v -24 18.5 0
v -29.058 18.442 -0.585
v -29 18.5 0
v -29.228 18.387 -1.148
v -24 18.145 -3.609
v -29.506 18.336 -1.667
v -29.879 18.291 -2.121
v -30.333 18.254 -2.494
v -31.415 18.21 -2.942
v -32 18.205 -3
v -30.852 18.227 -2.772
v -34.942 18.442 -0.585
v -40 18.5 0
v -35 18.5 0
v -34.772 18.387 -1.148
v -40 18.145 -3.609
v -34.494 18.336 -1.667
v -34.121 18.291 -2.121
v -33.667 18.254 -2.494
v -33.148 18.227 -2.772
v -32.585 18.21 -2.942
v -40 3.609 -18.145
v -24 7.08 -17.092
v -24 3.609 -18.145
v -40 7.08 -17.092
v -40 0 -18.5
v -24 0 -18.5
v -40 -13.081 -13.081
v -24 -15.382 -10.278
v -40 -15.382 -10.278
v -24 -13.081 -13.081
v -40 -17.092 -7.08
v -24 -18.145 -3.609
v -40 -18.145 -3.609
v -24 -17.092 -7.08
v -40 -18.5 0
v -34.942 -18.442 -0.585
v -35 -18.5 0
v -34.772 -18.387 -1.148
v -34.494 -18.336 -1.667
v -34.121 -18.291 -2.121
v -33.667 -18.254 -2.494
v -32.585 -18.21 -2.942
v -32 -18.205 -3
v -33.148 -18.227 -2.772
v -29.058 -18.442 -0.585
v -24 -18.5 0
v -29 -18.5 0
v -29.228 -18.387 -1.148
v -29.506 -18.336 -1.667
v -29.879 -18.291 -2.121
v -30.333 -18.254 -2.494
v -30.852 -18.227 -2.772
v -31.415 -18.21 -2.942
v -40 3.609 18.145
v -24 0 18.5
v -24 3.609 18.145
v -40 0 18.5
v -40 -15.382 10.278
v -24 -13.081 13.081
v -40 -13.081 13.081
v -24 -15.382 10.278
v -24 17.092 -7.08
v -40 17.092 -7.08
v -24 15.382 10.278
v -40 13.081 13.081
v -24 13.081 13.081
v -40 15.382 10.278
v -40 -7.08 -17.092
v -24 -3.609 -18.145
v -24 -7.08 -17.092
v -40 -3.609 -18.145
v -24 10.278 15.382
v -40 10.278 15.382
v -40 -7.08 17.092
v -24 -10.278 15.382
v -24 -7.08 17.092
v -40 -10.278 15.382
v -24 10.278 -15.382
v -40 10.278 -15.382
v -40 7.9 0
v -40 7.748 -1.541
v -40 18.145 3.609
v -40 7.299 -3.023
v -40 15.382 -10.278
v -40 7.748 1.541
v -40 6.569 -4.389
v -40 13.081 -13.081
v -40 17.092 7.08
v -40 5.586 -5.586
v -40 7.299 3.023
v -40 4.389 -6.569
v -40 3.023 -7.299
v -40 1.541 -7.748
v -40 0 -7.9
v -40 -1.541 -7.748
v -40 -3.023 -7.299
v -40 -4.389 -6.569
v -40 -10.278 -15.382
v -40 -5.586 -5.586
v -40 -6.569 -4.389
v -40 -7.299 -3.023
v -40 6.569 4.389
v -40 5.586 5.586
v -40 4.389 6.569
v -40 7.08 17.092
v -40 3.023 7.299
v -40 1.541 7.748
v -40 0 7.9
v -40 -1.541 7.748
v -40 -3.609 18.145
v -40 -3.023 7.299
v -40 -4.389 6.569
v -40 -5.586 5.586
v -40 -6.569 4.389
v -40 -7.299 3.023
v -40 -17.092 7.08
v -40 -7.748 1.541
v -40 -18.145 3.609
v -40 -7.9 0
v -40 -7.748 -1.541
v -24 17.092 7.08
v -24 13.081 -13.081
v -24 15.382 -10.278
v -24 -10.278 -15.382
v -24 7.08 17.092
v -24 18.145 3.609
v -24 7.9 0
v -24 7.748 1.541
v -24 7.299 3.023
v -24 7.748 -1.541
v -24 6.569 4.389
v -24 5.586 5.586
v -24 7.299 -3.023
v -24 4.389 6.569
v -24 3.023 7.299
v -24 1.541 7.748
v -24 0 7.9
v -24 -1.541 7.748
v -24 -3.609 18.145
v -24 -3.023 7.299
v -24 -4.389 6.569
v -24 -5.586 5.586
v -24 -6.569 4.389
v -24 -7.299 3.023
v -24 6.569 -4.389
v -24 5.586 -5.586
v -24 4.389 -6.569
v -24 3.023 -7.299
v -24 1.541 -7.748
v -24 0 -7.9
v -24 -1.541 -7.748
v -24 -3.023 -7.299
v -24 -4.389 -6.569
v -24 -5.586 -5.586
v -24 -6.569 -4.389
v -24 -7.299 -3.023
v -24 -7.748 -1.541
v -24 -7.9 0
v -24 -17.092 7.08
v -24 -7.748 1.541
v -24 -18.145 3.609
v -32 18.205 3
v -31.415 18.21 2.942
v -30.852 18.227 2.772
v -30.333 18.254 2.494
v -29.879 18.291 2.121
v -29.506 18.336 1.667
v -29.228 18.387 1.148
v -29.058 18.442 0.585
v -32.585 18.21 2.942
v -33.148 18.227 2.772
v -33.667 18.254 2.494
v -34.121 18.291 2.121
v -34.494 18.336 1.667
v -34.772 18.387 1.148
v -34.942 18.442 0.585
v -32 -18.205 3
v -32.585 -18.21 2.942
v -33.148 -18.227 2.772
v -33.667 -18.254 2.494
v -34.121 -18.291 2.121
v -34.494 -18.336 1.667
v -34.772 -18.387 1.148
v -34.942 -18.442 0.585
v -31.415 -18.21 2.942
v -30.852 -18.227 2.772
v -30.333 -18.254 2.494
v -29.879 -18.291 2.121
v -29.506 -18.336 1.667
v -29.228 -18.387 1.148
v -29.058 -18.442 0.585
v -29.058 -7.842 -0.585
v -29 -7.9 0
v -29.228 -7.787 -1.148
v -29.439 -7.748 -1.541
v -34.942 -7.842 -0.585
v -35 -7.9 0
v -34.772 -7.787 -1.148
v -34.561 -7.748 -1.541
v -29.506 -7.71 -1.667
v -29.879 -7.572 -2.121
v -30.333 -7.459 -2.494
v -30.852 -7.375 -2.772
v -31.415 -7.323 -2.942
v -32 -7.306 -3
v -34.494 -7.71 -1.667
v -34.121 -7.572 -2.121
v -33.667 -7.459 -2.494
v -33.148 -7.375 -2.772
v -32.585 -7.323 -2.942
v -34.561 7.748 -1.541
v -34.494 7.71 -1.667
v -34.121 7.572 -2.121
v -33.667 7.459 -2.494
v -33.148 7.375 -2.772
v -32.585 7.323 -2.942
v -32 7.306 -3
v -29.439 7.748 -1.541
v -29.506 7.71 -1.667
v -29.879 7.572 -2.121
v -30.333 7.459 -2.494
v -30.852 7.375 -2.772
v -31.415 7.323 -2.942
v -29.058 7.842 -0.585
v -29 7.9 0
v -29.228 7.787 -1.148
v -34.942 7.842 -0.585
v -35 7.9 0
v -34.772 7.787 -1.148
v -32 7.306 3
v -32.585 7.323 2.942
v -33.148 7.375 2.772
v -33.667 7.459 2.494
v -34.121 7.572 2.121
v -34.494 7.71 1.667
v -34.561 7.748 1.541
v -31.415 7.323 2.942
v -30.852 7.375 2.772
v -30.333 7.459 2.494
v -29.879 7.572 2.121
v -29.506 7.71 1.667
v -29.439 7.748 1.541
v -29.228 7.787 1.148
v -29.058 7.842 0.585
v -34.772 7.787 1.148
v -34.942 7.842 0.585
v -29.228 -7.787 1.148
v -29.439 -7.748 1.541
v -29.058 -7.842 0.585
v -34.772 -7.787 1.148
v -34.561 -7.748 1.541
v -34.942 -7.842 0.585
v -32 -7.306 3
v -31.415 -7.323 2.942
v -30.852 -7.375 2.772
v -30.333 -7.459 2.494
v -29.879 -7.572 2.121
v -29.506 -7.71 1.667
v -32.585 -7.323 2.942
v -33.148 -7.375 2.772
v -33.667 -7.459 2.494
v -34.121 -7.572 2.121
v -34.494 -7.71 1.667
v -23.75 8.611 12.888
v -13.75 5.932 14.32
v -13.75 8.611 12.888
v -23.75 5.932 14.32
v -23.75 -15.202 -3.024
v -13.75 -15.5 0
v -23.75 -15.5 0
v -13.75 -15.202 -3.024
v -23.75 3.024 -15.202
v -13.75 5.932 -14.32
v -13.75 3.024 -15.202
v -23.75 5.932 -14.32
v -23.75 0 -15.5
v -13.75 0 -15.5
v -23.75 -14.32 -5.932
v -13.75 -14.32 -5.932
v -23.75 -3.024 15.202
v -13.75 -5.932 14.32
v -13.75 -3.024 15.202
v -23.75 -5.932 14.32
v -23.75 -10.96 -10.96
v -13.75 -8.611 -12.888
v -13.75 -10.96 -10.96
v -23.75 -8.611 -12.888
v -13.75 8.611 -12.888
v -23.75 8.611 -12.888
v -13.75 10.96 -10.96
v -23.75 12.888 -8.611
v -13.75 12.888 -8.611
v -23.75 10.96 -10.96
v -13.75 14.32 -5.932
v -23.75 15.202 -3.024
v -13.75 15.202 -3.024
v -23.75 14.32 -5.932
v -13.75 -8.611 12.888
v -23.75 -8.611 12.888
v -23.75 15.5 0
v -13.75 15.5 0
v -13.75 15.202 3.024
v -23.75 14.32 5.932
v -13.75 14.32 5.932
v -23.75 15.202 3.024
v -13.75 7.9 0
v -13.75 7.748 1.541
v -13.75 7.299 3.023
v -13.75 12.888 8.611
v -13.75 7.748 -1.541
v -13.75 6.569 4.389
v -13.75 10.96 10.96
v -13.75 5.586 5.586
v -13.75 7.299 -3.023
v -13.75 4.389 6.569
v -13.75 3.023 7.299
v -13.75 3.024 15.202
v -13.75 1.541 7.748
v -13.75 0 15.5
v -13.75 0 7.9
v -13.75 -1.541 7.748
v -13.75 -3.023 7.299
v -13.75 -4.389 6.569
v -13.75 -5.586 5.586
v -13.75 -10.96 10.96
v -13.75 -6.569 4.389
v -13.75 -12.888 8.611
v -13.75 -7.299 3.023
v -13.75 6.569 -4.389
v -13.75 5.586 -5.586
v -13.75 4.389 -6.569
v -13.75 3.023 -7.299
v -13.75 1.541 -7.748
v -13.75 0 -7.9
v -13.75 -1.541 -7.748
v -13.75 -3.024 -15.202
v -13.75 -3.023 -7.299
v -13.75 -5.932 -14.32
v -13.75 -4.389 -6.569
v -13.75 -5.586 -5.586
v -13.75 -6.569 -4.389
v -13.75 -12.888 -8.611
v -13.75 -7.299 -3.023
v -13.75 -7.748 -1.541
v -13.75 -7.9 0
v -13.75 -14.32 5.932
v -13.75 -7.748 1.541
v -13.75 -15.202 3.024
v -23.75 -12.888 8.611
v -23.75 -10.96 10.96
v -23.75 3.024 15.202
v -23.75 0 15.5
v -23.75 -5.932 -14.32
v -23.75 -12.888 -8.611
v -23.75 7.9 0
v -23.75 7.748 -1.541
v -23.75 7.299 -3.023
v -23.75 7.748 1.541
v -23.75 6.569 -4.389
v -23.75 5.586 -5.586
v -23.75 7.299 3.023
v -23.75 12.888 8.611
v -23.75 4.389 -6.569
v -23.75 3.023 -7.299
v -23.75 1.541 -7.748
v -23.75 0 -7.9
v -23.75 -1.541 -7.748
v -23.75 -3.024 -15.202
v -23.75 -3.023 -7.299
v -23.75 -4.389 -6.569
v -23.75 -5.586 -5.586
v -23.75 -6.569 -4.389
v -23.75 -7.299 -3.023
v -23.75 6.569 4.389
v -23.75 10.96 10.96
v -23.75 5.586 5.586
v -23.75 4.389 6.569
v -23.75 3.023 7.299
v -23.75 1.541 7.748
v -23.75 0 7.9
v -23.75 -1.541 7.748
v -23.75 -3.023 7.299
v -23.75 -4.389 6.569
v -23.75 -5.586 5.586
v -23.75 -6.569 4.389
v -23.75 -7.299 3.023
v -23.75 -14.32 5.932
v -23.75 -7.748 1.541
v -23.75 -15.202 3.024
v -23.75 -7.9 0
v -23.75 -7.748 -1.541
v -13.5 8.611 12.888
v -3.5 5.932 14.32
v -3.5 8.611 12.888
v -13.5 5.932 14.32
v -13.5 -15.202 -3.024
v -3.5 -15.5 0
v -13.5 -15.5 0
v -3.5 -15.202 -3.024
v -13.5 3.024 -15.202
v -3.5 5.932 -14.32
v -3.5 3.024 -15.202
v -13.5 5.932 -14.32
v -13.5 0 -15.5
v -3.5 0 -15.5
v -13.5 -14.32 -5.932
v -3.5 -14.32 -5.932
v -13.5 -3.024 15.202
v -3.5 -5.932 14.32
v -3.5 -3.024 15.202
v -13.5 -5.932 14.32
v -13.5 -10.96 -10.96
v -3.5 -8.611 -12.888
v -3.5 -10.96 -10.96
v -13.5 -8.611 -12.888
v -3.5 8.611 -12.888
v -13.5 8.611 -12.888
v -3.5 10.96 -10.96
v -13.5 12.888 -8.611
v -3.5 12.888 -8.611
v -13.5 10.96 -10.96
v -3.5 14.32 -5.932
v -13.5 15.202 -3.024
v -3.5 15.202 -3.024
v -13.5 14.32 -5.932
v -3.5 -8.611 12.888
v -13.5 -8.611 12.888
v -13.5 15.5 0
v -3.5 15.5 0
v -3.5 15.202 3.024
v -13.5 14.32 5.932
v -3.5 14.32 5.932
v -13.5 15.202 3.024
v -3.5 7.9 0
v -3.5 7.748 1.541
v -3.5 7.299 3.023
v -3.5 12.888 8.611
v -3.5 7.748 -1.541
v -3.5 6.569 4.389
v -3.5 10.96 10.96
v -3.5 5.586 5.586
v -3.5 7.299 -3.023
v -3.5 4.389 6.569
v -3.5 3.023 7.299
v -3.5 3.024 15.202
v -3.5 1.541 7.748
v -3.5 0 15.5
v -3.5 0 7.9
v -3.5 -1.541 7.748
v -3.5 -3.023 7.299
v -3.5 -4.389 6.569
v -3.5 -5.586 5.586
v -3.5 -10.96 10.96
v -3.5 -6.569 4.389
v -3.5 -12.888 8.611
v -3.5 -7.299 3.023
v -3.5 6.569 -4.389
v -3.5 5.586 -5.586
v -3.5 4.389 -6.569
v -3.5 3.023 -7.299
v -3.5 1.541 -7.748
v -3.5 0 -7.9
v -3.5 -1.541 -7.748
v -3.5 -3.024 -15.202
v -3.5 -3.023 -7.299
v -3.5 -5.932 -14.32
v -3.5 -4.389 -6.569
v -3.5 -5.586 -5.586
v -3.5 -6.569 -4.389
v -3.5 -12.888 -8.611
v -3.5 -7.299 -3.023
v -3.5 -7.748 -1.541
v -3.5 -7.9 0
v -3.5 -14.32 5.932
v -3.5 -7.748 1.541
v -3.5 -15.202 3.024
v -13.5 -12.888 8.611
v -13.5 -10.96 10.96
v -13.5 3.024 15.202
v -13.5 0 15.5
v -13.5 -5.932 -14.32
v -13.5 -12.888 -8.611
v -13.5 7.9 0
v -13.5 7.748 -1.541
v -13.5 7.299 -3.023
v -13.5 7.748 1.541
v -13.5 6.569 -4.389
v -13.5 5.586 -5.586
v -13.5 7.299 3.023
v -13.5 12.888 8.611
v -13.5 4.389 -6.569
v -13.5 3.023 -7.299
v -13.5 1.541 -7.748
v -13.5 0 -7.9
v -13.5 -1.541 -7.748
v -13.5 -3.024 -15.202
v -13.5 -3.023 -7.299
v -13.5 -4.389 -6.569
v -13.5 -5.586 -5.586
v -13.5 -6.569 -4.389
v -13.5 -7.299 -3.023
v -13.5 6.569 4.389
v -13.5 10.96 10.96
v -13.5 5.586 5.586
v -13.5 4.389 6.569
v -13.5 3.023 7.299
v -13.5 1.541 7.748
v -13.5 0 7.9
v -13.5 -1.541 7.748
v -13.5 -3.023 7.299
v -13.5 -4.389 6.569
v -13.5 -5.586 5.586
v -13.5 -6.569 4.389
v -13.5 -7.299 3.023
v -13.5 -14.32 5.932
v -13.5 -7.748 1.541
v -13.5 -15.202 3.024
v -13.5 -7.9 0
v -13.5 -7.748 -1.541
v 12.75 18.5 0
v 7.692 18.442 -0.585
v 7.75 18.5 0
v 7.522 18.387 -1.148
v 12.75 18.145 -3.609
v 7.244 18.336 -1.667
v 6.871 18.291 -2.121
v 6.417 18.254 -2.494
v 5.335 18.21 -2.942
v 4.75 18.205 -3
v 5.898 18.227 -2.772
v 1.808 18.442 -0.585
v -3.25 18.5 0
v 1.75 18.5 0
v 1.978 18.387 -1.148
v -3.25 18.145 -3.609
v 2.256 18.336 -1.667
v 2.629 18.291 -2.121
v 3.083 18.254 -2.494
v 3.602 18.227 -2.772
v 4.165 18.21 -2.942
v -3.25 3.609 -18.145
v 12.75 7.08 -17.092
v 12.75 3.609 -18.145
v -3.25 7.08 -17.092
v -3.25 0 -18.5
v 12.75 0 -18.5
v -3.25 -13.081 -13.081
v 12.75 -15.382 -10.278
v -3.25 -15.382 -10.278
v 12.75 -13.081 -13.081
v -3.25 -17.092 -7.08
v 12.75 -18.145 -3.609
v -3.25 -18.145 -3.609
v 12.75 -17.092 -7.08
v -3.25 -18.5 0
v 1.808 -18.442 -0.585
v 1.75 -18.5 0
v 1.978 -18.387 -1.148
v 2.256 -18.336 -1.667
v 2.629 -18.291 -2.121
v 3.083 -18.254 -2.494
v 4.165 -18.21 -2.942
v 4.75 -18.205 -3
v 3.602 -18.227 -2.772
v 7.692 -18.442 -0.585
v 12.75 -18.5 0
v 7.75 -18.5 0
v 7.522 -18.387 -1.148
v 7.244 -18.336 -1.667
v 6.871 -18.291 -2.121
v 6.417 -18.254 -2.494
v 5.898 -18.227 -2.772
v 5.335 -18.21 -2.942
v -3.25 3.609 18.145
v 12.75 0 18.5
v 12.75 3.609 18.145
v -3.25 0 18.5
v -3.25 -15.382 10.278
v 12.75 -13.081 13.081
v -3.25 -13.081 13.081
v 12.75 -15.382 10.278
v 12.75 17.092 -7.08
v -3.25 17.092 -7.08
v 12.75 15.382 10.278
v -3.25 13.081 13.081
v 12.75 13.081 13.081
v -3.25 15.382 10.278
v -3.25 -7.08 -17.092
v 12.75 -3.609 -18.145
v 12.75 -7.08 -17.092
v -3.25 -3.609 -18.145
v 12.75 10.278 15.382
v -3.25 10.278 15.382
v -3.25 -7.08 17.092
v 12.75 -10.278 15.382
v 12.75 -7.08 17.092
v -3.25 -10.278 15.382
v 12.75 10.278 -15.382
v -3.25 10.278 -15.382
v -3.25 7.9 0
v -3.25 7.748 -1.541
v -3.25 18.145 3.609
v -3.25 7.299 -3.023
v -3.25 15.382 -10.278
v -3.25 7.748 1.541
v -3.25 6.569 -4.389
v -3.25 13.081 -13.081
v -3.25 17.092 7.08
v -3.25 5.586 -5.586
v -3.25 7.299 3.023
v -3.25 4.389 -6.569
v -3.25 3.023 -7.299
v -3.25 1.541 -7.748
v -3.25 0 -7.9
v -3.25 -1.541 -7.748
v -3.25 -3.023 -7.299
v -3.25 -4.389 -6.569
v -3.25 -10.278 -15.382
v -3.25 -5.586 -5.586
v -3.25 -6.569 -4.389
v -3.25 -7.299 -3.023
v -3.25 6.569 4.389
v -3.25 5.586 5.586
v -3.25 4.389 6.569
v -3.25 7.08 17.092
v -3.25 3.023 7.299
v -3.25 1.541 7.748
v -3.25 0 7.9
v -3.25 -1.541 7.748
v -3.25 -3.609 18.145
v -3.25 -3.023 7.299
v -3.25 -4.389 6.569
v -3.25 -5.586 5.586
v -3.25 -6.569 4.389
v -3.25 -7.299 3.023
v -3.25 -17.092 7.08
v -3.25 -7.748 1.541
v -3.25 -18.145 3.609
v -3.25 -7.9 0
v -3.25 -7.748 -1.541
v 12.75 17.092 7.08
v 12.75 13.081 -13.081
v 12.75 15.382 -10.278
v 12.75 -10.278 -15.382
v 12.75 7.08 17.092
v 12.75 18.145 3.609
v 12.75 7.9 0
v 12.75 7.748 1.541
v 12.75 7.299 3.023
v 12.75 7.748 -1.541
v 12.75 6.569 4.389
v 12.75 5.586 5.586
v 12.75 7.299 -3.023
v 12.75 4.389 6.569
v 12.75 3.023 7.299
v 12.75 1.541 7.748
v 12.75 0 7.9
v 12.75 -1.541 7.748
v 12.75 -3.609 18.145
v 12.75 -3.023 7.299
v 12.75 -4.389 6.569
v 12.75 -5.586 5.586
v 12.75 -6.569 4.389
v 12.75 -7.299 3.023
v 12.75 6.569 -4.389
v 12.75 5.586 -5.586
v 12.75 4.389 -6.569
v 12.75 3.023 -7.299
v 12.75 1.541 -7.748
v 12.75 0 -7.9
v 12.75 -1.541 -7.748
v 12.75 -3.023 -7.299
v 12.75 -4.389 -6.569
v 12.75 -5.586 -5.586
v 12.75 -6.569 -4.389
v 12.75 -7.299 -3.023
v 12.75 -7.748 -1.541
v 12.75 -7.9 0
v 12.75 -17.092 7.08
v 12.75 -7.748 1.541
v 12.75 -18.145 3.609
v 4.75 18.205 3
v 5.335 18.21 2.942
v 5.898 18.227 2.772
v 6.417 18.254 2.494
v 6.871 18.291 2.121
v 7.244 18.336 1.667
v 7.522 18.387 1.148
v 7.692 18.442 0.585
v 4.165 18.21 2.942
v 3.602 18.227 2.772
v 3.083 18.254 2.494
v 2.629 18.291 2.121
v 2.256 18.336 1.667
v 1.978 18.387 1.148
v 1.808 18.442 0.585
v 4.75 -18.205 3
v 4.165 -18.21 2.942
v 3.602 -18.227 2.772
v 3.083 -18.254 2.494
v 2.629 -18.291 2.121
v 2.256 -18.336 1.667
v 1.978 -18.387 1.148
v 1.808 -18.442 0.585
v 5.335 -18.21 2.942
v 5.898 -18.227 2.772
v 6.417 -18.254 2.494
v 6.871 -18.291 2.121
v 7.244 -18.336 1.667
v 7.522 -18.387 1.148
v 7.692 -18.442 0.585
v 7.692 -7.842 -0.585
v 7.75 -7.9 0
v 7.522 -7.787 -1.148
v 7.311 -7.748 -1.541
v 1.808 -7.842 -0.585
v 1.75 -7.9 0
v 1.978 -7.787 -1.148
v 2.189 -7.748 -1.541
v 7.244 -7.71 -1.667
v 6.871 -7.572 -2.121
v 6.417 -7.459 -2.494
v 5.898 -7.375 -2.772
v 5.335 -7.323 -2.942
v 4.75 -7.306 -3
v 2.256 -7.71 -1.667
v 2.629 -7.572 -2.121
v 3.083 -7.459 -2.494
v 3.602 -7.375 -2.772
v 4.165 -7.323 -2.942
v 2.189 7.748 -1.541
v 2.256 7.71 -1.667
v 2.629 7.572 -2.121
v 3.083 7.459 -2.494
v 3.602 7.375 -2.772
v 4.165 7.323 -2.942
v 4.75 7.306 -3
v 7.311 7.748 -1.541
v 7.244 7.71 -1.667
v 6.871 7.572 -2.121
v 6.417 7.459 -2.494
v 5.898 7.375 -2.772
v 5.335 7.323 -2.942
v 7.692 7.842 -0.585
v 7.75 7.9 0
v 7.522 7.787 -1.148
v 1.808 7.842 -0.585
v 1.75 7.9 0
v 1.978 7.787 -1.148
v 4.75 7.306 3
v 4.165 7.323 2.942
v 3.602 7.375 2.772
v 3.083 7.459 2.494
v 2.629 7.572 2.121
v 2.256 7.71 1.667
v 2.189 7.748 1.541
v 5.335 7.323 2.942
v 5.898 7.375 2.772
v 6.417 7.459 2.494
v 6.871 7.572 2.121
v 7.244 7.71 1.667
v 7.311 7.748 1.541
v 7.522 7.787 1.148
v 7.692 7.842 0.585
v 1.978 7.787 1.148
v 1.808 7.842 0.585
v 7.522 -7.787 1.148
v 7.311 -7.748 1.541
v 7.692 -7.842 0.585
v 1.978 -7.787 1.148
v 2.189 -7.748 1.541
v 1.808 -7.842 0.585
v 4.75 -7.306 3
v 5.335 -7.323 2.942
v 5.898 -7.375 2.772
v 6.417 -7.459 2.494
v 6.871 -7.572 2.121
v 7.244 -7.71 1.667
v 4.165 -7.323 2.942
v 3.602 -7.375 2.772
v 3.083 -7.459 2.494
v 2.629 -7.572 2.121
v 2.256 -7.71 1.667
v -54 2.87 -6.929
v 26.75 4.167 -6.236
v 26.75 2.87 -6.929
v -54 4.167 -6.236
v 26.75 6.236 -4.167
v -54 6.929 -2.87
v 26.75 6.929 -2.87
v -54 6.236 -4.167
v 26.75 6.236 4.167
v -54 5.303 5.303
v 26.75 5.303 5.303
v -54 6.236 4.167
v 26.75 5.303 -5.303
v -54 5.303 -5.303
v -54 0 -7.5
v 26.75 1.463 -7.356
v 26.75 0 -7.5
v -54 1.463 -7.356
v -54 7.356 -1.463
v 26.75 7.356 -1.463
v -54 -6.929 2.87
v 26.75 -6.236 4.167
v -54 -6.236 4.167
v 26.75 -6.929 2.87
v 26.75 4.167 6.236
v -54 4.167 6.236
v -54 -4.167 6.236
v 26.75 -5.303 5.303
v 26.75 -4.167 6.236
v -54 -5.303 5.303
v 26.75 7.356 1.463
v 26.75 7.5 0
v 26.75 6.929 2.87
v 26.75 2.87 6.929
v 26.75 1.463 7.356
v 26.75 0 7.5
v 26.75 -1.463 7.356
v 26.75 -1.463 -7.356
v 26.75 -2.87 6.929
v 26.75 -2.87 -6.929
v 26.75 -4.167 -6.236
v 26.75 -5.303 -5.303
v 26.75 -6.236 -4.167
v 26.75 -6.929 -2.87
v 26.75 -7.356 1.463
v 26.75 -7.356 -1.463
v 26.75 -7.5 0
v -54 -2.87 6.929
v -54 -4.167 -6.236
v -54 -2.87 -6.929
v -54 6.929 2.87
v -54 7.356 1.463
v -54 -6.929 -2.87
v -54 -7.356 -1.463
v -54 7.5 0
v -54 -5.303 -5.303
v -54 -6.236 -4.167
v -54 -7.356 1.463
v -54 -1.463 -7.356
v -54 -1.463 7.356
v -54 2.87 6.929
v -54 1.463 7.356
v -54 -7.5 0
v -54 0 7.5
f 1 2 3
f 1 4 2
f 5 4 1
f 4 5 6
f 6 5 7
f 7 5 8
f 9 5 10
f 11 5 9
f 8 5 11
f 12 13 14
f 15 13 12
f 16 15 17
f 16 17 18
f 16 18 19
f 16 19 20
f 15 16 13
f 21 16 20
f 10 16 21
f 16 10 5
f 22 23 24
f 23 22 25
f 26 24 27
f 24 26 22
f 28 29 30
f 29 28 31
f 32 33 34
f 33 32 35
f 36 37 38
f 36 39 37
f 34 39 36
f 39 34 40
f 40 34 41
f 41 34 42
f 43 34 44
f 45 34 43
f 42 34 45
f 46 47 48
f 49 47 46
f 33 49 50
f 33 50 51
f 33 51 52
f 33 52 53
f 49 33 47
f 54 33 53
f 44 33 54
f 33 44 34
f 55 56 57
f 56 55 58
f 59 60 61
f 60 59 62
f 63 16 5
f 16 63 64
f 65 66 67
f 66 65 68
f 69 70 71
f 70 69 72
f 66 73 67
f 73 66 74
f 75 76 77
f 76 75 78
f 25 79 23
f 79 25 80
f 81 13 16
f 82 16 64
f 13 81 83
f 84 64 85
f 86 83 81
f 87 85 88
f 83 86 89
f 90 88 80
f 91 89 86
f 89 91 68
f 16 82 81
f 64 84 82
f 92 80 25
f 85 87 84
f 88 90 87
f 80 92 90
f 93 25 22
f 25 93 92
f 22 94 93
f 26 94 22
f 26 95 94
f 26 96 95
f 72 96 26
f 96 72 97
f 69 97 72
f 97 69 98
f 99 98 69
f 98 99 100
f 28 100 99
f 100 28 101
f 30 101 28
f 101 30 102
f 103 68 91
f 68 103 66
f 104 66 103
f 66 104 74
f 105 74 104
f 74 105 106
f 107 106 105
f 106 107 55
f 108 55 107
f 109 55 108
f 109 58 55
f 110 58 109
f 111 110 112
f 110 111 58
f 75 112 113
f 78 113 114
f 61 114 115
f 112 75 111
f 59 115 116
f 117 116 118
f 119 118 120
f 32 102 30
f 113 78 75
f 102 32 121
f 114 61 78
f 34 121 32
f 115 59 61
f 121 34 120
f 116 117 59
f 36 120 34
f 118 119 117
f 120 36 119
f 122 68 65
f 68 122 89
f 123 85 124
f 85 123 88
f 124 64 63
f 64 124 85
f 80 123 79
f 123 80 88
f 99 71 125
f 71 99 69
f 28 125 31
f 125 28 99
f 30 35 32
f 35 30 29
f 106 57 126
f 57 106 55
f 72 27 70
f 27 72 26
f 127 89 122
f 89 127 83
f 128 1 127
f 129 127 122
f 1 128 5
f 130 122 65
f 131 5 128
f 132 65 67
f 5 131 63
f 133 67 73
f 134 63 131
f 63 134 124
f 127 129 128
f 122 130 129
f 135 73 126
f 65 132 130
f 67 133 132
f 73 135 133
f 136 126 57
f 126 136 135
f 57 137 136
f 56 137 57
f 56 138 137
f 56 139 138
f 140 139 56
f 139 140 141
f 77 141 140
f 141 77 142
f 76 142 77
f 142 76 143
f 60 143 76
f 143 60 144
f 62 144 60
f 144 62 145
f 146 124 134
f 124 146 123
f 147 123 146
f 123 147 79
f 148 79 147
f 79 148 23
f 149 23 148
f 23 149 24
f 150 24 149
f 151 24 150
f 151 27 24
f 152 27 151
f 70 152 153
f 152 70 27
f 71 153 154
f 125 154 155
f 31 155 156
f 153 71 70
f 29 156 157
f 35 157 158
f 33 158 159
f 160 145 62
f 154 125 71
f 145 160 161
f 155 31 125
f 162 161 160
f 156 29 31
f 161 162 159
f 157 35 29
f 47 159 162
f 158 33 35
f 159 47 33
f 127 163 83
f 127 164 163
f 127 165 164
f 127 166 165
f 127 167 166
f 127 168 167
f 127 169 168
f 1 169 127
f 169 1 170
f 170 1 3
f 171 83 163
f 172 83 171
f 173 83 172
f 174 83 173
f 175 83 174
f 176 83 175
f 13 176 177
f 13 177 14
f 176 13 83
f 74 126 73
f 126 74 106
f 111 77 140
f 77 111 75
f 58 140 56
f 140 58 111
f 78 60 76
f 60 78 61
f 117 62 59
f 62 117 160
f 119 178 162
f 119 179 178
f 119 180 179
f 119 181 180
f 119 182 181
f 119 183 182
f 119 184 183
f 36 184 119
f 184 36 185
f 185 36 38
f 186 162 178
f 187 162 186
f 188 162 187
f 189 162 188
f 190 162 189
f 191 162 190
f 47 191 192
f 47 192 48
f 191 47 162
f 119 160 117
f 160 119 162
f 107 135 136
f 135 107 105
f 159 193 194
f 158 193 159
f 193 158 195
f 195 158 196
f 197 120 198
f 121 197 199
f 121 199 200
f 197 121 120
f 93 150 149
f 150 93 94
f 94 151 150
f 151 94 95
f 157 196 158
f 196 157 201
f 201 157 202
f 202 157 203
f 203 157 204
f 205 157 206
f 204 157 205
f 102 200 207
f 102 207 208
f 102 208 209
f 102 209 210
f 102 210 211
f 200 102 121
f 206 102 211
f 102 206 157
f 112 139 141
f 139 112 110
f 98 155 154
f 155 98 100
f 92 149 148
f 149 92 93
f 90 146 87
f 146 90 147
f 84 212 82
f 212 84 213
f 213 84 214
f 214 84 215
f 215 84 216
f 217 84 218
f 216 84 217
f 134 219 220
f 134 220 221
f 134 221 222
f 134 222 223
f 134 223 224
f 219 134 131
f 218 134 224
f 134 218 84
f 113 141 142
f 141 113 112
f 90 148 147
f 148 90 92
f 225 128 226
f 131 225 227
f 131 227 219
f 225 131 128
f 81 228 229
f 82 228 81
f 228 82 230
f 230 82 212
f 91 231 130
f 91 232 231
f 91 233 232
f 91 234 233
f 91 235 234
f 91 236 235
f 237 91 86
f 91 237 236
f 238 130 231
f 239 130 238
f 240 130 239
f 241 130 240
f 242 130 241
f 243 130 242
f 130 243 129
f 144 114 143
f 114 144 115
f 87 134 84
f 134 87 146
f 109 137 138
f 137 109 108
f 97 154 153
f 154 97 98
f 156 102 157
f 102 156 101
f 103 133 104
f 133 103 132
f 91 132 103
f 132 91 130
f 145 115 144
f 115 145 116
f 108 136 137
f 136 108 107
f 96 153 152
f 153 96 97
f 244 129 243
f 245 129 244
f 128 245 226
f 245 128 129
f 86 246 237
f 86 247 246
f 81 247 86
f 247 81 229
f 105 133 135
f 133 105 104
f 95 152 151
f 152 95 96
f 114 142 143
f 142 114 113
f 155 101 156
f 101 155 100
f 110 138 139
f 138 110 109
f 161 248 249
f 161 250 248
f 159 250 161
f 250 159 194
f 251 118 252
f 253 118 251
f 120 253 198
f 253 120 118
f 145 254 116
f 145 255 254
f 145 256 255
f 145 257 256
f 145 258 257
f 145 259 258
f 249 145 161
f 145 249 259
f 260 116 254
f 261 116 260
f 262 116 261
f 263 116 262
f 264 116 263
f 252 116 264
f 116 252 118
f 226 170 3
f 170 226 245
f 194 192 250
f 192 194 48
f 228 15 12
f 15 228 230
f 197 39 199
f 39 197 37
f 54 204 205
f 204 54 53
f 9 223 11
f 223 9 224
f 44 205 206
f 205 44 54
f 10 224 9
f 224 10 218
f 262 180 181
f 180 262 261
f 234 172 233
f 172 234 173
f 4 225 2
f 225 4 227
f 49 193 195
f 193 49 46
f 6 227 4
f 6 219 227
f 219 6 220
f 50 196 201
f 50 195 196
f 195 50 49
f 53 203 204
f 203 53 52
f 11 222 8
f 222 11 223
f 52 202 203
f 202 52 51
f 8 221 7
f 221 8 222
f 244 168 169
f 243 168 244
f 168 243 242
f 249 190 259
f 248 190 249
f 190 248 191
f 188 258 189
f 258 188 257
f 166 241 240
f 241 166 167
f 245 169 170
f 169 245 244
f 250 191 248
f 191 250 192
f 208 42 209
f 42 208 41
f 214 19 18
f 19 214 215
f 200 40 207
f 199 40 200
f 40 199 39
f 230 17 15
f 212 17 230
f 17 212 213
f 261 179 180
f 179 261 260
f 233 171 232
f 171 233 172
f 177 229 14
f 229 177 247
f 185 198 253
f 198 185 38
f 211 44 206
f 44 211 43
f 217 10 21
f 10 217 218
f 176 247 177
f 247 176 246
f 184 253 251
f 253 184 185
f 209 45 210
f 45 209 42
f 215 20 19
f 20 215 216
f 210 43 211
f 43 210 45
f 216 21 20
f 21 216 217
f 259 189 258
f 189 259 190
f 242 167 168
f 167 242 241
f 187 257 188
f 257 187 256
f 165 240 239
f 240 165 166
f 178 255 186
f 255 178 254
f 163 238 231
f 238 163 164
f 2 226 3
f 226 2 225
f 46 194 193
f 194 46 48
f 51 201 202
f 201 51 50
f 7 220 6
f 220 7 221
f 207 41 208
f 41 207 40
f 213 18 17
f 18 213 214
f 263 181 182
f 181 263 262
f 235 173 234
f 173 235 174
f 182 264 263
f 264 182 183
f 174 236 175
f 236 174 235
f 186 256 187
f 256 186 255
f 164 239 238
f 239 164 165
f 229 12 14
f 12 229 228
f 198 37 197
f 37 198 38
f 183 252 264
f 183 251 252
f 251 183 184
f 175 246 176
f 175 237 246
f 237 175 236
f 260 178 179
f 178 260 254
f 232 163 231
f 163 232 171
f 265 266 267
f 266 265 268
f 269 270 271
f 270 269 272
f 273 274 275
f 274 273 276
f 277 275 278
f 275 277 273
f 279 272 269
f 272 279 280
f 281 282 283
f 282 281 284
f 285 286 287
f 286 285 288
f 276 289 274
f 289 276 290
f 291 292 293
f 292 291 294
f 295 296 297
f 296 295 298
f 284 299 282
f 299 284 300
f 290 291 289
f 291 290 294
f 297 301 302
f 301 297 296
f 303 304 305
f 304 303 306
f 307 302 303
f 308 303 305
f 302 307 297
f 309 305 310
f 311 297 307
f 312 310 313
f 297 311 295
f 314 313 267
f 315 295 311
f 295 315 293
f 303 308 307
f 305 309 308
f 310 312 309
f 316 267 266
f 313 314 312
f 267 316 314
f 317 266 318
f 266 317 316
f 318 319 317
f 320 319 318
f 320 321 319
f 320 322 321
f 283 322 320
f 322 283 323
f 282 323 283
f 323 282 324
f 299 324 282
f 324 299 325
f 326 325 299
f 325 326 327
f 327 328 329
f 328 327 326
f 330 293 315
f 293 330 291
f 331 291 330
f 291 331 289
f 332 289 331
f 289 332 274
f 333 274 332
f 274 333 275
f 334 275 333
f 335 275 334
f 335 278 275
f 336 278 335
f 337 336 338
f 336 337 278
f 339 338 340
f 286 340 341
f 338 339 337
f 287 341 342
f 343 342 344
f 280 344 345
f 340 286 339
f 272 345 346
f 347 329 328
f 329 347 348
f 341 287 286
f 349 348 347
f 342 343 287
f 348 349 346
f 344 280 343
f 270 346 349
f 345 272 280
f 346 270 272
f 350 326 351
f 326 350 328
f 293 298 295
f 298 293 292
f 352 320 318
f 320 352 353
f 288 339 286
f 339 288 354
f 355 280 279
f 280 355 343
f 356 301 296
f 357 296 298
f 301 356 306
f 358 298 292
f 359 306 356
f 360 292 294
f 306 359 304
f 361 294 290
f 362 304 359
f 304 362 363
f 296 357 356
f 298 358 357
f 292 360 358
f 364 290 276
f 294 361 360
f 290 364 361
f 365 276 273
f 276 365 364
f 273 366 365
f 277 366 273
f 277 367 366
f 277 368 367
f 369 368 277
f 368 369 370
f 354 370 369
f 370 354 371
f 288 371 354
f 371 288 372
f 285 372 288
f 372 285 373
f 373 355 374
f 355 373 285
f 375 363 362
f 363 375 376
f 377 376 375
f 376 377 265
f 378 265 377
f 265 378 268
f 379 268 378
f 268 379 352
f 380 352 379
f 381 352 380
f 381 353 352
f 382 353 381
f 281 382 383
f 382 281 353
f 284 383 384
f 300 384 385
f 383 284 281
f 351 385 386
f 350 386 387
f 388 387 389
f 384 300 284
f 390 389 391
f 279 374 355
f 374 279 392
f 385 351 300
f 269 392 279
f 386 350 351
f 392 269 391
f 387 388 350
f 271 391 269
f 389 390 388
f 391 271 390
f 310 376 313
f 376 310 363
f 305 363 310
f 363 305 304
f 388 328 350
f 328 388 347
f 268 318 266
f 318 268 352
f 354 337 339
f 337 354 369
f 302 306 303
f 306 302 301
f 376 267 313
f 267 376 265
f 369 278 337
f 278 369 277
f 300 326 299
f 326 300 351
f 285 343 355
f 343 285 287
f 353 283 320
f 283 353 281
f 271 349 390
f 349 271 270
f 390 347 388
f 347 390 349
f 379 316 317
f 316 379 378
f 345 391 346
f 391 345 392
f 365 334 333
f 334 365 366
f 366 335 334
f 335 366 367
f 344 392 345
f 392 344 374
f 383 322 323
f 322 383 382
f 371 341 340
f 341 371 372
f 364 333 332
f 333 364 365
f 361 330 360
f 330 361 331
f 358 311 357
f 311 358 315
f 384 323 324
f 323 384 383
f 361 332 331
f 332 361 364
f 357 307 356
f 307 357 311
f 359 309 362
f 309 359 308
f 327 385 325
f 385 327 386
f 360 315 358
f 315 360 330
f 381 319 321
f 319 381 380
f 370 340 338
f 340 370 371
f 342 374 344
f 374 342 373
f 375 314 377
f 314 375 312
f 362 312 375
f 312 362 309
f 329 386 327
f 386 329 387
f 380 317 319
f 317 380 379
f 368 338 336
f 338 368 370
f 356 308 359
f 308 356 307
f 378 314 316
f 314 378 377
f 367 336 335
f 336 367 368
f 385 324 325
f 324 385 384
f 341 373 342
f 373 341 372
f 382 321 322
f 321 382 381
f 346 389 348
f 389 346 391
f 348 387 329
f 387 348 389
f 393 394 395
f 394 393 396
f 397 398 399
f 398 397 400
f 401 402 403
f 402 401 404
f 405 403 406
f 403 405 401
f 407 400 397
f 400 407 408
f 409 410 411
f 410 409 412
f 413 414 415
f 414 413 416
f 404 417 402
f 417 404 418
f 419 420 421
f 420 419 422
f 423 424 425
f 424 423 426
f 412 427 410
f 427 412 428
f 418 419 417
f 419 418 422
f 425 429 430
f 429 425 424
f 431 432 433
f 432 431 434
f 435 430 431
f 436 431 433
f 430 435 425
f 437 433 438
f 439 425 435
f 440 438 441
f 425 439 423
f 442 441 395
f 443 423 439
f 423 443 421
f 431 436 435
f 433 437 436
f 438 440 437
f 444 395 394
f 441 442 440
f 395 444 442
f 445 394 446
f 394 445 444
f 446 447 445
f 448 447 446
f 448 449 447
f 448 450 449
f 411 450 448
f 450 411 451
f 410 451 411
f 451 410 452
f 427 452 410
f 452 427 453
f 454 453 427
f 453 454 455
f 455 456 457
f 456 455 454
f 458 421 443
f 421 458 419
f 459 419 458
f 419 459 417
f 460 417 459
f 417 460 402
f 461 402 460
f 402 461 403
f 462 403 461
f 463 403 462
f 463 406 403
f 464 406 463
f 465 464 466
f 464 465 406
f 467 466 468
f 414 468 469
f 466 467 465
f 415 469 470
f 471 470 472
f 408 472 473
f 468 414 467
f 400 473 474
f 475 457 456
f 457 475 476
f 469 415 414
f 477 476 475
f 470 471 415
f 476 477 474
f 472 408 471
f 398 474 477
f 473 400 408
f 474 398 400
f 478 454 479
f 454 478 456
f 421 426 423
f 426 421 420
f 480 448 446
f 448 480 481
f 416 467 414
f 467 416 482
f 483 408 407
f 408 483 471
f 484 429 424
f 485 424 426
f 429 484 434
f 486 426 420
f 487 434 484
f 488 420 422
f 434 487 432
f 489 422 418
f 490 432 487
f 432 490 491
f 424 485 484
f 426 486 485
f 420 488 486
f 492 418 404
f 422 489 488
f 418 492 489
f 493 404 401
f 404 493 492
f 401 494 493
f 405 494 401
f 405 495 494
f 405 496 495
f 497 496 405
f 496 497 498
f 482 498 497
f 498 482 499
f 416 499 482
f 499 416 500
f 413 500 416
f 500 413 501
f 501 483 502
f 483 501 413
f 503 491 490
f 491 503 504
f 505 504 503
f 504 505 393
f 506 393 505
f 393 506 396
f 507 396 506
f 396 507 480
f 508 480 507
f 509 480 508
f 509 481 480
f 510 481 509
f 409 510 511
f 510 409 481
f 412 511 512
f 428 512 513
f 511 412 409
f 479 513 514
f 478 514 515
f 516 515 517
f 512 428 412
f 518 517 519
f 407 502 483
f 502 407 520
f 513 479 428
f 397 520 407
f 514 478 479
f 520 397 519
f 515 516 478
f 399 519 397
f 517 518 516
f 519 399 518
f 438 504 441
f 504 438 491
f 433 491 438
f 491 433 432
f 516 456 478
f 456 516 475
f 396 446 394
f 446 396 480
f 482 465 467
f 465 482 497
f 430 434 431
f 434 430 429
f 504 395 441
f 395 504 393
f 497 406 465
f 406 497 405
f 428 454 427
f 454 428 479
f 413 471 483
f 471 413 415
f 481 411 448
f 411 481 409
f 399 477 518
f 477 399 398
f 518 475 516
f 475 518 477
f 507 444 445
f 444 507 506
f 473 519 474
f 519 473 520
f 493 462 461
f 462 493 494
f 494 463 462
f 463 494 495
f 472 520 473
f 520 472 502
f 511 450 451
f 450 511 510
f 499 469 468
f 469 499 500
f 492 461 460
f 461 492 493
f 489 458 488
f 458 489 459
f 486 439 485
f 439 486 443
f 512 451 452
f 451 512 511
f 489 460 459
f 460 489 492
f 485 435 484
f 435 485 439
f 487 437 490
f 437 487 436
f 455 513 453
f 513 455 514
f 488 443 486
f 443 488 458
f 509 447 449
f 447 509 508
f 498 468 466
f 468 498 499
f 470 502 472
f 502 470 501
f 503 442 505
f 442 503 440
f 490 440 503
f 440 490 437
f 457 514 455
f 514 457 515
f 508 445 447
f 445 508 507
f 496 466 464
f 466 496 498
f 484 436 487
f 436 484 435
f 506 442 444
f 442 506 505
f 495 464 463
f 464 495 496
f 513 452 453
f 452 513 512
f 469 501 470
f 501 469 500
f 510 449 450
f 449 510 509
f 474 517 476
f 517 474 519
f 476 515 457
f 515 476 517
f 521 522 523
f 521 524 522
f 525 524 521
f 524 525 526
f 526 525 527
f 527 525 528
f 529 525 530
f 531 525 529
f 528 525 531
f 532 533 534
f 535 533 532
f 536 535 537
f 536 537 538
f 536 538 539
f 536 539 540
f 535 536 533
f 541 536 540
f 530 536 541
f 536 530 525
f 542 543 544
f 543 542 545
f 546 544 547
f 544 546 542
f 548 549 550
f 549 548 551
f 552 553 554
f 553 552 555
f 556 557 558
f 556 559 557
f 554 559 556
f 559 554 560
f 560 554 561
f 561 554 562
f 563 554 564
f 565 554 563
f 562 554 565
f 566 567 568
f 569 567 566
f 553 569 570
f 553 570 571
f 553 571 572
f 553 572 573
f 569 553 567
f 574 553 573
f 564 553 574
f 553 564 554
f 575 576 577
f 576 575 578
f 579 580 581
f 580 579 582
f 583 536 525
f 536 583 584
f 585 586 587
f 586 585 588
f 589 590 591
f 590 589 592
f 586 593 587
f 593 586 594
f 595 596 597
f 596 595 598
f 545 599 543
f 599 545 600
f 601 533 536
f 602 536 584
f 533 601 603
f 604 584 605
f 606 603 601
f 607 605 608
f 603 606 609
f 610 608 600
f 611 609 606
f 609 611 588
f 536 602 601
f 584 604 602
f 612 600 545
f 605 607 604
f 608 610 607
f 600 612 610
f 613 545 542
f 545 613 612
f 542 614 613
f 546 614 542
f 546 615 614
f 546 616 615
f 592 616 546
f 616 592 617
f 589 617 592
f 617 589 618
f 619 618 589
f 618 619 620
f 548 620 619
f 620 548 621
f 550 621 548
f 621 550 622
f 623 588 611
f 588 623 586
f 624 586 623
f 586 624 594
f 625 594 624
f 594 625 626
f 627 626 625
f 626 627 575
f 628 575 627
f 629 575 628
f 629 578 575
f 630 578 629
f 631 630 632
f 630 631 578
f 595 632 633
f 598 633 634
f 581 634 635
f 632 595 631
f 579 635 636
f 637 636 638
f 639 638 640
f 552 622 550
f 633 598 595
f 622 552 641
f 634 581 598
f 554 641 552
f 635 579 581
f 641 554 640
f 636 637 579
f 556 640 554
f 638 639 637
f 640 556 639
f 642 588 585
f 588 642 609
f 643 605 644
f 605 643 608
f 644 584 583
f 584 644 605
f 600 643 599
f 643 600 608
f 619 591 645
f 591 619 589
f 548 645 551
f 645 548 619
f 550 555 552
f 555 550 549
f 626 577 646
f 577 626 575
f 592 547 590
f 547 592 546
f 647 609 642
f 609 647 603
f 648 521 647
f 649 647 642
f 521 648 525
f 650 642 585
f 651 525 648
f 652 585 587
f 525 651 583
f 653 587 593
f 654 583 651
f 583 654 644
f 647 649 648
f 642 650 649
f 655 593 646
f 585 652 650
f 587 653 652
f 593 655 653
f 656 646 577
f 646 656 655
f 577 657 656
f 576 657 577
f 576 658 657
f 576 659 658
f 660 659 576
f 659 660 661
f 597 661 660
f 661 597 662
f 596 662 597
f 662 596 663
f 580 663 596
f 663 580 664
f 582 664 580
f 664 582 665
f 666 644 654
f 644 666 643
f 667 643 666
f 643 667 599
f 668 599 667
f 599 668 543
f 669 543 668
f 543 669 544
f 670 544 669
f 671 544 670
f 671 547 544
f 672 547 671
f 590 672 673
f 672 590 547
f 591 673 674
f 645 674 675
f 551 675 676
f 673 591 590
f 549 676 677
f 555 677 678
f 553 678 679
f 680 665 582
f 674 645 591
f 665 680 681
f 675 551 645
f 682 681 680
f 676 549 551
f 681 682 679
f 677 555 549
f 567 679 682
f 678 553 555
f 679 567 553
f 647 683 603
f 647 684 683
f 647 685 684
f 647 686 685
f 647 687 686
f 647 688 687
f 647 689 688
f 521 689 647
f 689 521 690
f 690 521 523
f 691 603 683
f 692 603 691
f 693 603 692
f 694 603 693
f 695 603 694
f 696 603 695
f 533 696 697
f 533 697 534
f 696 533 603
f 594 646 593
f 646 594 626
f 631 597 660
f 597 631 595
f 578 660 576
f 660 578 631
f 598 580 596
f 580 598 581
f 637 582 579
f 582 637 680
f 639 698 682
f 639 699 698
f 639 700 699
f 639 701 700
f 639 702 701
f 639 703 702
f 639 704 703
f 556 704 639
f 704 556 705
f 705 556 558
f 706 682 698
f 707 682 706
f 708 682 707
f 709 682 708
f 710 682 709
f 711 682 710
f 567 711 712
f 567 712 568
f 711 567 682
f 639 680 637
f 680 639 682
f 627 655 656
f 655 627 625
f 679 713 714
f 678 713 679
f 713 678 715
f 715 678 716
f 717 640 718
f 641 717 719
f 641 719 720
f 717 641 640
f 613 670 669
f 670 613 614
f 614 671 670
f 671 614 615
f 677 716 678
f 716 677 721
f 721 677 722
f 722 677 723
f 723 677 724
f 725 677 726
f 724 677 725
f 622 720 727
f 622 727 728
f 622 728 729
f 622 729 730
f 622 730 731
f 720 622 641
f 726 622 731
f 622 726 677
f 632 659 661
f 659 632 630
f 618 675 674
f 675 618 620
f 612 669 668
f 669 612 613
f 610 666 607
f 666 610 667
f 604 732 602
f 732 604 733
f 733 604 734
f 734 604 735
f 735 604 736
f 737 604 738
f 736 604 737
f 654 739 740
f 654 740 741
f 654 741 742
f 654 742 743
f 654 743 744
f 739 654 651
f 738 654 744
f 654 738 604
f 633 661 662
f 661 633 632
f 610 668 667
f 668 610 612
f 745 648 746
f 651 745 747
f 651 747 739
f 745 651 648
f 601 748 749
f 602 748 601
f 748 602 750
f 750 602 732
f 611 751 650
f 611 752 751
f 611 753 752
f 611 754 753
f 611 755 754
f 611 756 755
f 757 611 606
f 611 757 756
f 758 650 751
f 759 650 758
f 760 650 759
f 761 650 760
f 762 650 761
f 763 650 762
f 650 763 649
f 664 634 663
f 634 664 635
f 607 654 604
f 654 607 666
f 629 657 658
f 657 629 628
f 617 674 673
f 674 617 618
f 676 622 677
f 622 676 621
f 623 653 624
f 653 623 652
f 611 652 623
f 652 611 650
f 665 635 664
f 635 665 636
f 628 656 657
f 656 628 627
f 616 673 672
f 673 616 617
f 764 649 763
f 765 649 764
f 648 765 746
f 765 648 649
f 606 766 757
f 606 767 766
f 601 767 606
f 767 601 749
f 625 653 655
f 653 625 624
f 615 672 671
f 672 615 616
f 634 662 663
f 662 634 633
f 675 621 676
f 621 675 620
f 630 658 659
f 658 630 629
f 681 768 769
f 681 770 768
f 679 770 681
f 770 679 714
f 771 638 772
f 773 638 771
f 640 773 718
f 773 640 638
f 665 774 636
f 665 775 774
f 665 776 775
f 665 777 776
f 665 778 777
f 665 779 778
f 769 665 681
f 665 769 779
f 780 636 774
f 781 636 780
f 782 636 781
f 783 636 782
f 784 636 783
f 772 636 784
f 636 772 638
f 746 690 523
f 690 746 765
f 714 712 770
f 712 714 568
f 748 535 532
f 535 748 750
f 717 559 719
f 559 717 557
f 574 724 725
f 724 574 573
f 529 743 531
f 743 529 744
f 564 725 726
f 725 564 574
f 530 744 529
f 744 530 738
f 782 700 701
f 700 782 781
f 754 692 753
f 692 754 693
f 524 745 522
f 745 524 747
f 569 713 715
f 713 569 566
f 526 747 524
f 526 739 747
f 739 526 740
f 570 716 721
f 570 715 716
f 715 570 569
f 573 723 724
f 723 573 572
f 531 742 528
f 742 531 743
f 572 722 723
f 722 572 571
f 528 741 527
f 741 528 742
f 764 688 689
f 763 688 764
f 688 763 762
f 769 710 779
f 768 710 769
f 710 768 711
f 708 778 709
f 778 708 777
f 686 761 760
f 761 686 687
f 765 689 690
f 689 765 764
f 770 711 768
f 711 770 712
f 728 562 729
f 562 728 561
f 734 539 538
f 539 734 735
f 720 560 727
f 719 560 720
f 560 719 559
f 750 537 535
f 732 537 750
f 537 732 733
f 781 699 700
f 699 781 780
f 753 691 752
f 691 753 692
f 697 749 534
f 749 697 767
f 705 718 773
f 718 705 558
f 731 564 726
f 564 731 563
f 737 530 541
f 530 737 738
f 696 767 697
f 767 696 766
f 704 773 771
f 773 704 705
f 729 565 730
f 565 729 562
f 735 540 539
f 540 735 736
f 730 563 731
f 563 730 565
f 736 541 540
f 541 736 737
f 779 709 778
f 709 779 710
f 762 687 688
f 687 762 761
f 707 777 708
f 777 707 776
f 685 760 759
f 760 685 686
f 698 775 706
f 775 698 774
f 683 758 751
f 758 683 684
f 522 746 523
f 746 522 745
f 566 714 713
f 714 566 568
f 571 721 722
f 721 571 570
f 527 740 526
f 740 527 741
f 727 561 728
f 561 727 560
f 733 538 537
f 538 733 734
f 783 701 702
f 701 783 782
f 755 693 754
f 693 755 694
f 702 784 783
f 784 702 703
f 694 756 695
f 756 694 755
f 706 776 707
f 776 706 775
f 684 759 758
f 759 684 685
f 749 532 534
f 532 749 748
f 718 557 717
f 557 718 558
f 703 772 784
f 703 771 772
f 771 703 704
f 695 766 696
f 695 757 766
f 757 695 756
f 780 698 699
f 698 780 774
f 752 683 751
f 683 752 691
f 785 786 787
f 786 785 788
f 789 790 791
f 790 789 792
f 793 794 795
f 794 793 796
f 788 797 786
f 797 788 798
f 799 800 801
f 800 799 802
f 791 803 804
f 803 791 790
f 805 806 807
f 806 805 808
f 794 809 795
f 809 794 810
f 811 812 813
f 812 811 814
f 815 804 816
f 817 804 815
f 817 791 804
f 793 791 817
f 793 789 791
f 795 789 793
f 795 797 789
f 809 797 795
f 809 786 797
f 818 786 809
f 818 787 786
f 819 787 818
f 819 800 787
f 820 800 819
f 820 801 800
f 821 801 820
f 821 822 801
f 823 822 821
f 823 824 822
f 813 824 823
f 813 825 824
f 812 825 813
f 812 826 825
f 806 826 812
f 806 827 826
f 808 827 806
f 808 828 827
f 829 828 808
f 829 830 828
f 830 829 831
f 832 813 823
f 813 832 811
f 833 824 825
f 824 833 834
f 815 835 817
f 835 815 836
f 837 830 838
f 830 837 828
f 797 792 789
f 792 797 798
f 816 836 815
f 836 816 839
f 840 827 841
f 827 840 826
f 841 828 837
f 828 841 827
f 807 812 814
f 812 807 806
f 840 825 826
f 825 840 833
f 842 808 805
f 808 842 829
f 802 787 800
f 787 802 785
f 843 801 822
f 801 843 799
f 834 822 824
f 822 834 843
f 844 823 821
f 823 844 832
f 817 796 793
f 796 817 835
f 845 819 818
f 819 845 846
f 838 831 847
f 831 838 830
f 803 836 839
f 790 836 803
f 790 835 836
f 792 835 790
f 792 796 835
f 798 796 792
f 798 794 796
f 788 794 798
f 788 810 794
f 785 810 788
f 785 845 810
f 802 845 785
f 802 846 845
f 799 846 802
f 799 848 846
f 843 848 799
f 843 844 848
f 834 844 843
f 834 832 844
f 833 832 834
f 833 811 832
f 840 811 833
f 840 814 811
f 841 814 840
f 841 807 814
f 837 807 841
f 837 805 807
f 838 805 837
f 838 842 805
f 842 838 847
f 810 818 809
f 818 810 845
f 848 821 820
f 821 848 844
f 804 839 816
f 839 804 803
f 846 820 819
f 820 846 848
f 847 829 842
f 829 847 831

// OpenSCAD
$fn = 32;

// ------------------------------------------------------------------------
// Shaft with rings and collars: d15 shaft, 4 rings
// Every part is its own module, assembly() places them once.
// ------------------------------------------------------------------------

// --- part 1 ---
module shaft() {
  translate([0, 0, -40.375]) cylinder(h = 80.75, d = 15);
}

// --- part 2 ---
module collar_a() {
  difference() {
    cylinder(h = 16, d = 37);
    translate([0, 0, -1]) cylinder(h = 18, d = 15.8);
    translate([0, 0, 8]) rotate([90, 0, 0]) cylinder(h = 39, d = 6, center = true);
  }
}

// --- part 3 ---
module spacer_a() {
  difference() {
      translate([0, 0, 0]) cylinder(h = 10, d = 31);
      translate([0, 0, -1]) cylinder(h = 12, d = 15.8);
    }
}

// --- part 4 ---
module spacer_b() {
  difference() {
      translate([0, 0, 0]) cylinder(h = 10, d = 31);
      translate([0, 0, -1]) cylinder(h = 12, d = 15.8);
    }
}

// --- part 5 ---
module collar_b() {
  difference() {
    cylinder(h = 16, d = 37);
    translate([0, 0, -1]) cylinder(h = 18, d = 15.8);
    translate([0, 0, 8]) rotate([90, 0, 0]) cylinder(h = 39, d = 6, center = true);
  }
}

// --- assembly ---
module assembly() {
  translate([-13.625, 0, 0]) rotate([0, 90, 0]) shaft();
  translate([-40, 0, 0]) rotate([0, 90, 0]) collar_a();
  translate([-23.75, 0, 0]) rotate([0, 90, 0]) spacer_a();
  translate([-13.5, 0, 0]) rotate([0, 90, 0]) spacer_b();
  translate([-3.25, 0, 0]) rotate([0, 90, 0]) collar_b();
}

assembly();
